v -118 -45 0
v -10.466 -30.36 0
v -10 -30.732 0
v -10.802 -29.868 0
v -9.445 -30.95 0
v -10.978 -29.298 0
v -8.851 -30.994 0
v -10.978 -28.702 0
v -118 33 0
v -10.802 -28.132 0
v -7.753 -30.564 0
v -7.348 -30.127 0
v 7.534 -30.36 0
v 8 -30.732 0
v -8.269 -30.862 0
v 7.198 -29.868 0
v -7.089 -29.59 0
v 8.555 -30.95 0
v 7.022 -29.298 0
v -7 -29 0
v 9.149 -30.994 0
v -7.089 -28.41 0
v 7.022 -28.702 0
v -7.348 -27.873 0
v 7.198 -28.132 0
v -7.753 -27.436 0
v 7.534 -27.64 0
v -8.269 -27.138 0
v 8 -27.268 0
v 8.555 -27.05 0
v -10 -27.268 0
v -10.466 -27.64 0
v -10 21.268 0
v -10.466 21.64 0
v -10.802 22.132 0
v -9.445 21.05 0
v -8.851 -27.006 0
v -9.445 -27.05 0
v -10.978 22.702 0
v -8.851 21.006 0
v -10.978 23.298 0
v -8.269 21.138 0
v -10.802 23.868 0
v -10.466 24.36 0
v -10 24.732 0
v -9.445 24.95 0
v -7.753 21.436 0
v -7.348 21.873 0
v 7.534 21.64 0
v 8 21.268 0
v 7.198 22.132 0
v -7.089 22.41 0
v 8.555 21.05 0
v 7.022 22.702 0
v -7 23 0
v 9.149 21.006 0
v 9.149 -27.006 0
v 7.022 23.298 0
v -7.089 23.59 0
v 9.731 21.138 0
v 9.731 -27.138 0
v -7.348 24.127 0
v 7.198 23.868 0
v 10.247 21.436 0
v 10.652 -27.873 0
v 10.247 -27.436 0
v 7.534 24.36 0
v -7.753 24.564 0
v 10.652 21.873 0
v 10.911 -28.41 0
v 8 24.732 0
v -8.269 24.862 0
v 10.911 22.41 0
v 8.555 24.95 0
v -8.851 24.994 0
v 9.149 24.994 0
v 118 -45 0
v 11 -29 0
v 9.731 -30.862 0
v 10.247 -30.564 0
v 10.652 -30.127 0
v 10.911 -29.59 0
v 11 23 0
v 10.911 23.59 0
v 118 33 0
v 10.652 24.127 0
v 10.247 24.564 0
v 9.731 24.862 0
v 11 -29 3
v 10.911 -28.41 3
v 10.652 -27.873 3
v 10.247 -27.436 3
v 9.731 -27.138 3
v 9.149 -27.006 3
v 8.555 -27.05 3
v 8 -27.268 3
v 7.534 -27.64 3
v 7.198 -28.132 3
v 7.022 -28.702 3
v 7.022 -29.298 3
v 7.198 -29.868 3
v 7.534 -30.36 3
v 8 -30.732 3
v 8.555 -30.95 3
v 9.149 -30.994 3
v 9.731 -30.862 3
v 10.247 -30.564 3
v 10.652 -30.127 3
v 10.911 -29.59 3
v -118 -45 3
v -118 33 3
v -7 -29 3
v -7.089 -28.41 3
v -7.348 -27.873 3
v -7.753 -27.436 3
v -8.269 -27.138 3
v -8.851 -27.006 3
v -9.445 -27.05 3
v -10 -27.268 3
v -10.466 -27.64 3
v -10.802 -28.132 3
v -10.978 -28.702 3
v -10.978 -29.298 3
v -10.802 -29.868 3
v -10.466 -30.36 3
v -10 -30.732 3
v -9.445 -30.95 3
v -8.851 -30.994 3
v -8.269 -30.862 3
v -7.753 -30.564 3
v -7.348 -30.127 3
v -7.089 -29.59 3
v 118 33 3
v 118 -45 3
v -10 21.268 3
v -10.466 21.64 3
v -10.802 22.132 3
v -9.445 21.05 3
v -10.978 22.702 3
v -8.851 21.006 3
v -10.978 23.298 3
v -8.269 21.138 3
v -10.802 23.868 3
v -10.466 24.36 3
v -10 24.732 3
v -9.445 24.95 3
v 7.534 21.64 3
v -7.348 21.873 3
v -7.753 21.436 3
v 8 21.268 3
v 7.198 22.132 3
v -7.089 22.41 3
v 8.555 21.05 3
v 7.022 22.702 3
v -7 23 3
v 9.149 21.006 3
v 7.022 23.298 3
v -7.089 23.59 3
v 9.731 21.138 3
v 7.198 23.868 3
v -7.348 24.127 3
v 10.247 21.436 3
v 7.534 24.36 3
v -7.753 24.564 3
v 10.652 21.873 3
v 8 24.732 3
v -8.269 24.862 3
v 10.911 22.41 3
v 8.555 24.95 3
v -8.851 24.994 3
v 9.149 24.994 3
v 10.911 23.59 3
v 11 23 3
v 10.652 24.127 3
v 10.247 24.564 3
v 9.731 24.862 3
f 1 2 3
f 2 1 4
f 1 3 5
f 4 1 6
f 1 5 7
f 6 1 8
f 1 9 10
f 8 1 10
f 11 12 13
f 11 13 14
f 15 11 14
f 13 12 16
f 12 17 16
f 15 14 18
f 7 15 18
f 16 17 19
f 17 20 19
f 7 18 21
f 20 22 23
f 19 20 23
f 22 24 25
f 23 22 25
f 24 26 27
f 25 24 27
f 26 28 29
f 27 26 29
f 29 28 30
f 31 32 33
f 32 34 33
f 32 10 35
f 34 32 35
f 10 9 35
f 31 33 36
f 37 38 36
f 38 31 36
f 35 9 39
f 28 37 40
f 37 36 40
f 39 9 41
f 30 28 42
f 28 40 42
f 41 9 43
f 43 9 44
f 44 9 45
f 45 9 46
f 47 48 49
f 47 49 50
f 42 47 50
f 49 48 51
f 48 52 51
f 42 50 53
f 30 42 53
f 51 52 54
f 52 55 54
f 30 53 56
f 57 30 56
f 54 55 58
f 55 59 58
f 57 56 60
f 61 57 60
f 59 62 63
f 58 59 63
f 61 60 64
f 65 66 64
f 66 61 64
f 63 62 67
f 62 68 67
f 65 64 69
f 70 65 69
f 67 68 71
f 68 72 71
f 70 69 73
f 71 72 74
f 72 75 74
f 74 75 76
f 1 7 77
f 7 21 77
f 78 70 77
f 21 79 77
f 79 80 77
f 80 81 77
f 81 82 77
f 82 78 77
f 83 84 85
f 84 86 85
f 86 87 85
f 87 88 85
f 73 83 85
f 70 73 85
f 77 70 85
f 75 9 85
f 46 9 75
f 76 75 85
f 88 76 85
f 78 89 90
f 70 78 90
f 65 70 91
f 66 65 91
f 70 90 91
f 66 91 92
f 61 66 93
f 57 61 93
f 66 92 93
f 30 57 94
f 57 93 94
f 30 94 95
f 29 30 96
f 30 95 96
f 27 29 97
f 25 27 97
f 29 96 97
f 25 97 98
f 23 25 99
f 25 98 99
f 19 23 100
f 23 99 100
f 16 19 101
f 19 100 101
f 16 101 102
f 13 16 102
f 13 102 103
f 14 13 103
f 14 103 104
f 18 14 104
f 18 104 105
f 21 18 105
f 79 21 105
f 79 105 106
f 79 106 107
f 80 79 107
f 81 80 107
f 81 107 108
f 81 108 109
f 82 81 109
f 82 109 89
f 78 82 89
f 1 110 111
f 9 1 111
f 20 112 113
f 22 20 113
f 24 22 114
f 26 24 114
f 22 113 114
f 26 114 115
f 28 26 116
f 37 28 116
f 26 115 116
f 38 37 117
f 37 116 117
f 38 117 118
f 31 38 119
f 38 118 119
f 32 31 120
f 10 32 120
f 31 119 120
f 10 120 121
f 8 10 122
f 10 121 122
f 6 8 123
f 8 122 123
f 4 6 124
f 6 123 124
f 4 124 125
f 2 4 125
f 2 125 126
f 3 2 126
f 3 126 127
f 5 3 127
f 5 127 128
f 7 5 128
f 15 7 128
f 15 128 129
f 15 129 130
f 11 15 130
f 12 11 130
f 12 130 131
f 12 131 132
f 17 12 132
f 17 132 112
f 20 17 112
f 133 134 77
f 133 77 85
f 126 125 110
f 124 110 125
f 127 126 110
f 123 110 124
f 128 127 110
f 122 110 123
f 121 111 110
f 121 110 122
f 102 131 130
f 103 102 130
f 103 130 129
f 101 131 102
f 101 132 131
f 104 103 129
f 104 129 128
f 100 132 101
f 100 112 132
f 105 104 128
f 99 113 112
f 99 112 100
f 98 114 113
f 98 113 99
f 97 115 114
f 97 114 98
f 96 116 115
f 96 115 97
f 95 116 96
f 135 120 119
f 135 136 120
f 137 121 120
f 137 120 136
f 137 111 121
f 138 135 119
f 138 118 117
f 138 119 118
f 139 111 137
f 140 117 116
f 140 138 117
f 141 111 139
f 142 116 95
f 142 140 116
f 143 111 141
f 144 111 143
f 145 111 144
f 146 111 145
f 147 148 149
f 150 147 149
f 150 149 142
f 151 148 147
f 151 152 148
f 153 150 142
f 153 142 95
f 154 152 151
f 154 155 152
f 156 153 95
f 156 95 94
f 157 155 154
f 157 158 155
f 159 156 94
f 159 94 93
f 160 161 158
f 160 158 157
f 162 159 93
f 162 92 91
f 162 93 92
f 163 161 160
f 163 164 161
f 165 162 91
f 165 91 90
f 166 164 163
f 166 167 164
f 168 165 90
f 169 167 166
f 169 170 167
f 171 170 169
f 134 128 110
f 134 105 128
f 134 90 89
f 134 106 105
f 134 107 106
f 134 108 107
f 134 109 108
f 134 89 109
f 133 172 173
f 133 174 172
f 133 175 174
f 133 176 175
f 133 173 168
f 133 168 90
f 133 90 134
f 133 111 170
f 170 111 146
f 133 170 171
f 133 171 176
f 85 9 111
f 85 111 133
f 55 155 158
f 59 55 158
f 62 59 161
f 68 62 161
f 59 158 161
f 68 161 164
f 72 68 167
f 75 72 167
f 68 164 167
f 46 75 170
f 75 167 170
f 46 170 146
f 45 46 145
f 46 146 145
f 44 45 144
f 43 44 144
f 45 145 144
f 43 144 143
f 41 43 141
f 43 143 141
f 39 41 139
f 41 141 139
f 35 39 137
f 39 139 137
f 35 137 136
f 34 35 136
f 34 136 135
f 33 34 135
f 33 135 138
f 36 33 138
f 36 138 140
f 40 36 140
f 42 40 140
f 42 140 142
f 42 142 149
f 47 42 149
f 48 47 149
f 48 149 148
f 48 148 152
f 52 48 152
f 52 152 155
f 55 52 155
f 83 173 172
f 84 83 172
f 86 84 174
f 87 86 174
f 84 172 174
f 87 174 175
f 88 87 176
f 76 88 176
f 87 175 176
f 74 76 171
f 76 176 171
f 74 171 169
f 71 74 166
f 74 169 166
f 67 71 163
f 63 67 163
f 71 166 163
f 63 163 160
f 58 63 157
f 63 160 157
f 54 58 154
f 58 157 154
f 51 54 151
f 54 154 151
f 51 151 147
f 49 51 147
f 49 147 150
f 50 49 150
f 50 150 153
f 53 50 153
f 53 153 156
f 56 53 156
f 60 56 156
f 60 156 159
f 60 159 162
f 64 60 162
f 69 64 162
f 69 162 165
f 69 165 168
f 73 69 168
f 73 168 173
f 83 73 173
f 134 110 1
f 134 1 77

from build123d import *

# Parameters (mm, degrees)
ESQUISSE1_W             = 236
ESQUISSE1_H             = 72
BOSS_EXTRU_1_DEPTH      = 3
ENL_V_MAT_EXTRU_1_REACH = 126.314
ESQUISSE2_R             = 2
ESQUISSE3_W             = 236
ESQUISSE3_H             = 6
BOSS_EXTRU_2_DEPTH      = 3


with BuildPart() as part:
    # Esquisse1 → Boss.-Extru.1 (new body)
    with BuildSketch(Plane.XY):
        with Locations((0, -3)):
            Rectangle(ESQUISSE1_W, ESQUISSE1_H)
    extrude(amount=BOSS_EXTRU_1_DEPTH)

    # Esquisse2 → Enlèv. mat.-Extru.1 (cut, up to next)
    with BuildSketch(Plane.XY.offset(3), mode=Mode.PRIVATE) as enl_v_mat_extru_1_sk1:
        with Locations((9, -29)):
            Circle(ESQUISSE2_R)
    enl_v_mat_extru_1_tool1 = extrude(enl_v_mat_extru_1_sk1.sketch, amount=-ENL_V_MAT_EXTRU_1_REACH, mode=Mode.PRIVATE) & part.part
    # Esquisse2 → Enlèv. mat.-Extru.1 (cut, up to next)
    with BuildSketch(Plane.XY.offset(3), mode=Mode.PRIVATE) as enl_v_mat_extru_1_sk2:
        with Locations((-9, -29)):
            Circle(ESQUISSE2_R)
    enl_v_mat_extru_1_tool2 = extrude(enl_v_mat_extru_1_sk2.sketch, amount=-ENL_V_MAT_EXTRU_1_REACH, mode=Mode.PRIVATE) & part.part
    # Esquisse2 → Enlèv. mat.-Extru.1 (cut, up to next)
    with BuildSketch(Plane.XY.offset(3), mode=Mode.PRIVATE) as enl_v_mat_extru_1_sk3:
        with Locations((-9, 23)):
            Circle(ESQUISSE2_R)
    enl_v_mat_extru_1_tool3 = extrude(enl_v_mat_extru_1_sk3.sketch, amount=-ENL_V_MAT_EXTRU_1_REACH, mode=Mode.PRIVATE) & part.part
    # Esquisse2 → Enlèv. mat.-Extru.1 (cut, up to next)
    with BuildSketch(Plane.XY.offset(3), mode=Mode.PRIVATE) as enl_v_mat_extru_1_sk4:
        with Locations((9, 23)):
            Circle(ESQUISSE2_R)
    enl_v_mat_extru_1_tool4 = extrude(enl_v_mat_extru_1_sk4.sketch, amount=-ENL_V_MAT_EXTRU_1_REACH, mode=Mode.PRIVATE) & part.part
    add(enl_v_mat_extru_1_tool1.solids().sort_by_distance((9, -29, 3))[0], mode=Mode.SUBTRACT)
    add(enl_v_mat_extru_1_tool2.solids().sort_by_distance((-9, -29, 3))[0], mode=Mode.SUBTRACT)
    add(enl_v_mat_extru_1_tool3.solids().sort_by_distance((-9, 23, 3))[0], mode=Mode.SUBTRACT)
    add(enl_v_mat_extru_1_tool4.solids().sort_by_distance((9, 23, 3))[0], mode=Mode.SUBTRACT)

    # Esquisse3 → Boss.-Extru.2 (add)
    with BuildSketch(Plane.XY.offset(3)):
        with Locations((0, -42)):
            Rectangle(ESQUISSE3_W, ESQUISSE3_H)
    extrude(amount=-BOSS_EXTRU_2_DEPTH)


solid = part.part
